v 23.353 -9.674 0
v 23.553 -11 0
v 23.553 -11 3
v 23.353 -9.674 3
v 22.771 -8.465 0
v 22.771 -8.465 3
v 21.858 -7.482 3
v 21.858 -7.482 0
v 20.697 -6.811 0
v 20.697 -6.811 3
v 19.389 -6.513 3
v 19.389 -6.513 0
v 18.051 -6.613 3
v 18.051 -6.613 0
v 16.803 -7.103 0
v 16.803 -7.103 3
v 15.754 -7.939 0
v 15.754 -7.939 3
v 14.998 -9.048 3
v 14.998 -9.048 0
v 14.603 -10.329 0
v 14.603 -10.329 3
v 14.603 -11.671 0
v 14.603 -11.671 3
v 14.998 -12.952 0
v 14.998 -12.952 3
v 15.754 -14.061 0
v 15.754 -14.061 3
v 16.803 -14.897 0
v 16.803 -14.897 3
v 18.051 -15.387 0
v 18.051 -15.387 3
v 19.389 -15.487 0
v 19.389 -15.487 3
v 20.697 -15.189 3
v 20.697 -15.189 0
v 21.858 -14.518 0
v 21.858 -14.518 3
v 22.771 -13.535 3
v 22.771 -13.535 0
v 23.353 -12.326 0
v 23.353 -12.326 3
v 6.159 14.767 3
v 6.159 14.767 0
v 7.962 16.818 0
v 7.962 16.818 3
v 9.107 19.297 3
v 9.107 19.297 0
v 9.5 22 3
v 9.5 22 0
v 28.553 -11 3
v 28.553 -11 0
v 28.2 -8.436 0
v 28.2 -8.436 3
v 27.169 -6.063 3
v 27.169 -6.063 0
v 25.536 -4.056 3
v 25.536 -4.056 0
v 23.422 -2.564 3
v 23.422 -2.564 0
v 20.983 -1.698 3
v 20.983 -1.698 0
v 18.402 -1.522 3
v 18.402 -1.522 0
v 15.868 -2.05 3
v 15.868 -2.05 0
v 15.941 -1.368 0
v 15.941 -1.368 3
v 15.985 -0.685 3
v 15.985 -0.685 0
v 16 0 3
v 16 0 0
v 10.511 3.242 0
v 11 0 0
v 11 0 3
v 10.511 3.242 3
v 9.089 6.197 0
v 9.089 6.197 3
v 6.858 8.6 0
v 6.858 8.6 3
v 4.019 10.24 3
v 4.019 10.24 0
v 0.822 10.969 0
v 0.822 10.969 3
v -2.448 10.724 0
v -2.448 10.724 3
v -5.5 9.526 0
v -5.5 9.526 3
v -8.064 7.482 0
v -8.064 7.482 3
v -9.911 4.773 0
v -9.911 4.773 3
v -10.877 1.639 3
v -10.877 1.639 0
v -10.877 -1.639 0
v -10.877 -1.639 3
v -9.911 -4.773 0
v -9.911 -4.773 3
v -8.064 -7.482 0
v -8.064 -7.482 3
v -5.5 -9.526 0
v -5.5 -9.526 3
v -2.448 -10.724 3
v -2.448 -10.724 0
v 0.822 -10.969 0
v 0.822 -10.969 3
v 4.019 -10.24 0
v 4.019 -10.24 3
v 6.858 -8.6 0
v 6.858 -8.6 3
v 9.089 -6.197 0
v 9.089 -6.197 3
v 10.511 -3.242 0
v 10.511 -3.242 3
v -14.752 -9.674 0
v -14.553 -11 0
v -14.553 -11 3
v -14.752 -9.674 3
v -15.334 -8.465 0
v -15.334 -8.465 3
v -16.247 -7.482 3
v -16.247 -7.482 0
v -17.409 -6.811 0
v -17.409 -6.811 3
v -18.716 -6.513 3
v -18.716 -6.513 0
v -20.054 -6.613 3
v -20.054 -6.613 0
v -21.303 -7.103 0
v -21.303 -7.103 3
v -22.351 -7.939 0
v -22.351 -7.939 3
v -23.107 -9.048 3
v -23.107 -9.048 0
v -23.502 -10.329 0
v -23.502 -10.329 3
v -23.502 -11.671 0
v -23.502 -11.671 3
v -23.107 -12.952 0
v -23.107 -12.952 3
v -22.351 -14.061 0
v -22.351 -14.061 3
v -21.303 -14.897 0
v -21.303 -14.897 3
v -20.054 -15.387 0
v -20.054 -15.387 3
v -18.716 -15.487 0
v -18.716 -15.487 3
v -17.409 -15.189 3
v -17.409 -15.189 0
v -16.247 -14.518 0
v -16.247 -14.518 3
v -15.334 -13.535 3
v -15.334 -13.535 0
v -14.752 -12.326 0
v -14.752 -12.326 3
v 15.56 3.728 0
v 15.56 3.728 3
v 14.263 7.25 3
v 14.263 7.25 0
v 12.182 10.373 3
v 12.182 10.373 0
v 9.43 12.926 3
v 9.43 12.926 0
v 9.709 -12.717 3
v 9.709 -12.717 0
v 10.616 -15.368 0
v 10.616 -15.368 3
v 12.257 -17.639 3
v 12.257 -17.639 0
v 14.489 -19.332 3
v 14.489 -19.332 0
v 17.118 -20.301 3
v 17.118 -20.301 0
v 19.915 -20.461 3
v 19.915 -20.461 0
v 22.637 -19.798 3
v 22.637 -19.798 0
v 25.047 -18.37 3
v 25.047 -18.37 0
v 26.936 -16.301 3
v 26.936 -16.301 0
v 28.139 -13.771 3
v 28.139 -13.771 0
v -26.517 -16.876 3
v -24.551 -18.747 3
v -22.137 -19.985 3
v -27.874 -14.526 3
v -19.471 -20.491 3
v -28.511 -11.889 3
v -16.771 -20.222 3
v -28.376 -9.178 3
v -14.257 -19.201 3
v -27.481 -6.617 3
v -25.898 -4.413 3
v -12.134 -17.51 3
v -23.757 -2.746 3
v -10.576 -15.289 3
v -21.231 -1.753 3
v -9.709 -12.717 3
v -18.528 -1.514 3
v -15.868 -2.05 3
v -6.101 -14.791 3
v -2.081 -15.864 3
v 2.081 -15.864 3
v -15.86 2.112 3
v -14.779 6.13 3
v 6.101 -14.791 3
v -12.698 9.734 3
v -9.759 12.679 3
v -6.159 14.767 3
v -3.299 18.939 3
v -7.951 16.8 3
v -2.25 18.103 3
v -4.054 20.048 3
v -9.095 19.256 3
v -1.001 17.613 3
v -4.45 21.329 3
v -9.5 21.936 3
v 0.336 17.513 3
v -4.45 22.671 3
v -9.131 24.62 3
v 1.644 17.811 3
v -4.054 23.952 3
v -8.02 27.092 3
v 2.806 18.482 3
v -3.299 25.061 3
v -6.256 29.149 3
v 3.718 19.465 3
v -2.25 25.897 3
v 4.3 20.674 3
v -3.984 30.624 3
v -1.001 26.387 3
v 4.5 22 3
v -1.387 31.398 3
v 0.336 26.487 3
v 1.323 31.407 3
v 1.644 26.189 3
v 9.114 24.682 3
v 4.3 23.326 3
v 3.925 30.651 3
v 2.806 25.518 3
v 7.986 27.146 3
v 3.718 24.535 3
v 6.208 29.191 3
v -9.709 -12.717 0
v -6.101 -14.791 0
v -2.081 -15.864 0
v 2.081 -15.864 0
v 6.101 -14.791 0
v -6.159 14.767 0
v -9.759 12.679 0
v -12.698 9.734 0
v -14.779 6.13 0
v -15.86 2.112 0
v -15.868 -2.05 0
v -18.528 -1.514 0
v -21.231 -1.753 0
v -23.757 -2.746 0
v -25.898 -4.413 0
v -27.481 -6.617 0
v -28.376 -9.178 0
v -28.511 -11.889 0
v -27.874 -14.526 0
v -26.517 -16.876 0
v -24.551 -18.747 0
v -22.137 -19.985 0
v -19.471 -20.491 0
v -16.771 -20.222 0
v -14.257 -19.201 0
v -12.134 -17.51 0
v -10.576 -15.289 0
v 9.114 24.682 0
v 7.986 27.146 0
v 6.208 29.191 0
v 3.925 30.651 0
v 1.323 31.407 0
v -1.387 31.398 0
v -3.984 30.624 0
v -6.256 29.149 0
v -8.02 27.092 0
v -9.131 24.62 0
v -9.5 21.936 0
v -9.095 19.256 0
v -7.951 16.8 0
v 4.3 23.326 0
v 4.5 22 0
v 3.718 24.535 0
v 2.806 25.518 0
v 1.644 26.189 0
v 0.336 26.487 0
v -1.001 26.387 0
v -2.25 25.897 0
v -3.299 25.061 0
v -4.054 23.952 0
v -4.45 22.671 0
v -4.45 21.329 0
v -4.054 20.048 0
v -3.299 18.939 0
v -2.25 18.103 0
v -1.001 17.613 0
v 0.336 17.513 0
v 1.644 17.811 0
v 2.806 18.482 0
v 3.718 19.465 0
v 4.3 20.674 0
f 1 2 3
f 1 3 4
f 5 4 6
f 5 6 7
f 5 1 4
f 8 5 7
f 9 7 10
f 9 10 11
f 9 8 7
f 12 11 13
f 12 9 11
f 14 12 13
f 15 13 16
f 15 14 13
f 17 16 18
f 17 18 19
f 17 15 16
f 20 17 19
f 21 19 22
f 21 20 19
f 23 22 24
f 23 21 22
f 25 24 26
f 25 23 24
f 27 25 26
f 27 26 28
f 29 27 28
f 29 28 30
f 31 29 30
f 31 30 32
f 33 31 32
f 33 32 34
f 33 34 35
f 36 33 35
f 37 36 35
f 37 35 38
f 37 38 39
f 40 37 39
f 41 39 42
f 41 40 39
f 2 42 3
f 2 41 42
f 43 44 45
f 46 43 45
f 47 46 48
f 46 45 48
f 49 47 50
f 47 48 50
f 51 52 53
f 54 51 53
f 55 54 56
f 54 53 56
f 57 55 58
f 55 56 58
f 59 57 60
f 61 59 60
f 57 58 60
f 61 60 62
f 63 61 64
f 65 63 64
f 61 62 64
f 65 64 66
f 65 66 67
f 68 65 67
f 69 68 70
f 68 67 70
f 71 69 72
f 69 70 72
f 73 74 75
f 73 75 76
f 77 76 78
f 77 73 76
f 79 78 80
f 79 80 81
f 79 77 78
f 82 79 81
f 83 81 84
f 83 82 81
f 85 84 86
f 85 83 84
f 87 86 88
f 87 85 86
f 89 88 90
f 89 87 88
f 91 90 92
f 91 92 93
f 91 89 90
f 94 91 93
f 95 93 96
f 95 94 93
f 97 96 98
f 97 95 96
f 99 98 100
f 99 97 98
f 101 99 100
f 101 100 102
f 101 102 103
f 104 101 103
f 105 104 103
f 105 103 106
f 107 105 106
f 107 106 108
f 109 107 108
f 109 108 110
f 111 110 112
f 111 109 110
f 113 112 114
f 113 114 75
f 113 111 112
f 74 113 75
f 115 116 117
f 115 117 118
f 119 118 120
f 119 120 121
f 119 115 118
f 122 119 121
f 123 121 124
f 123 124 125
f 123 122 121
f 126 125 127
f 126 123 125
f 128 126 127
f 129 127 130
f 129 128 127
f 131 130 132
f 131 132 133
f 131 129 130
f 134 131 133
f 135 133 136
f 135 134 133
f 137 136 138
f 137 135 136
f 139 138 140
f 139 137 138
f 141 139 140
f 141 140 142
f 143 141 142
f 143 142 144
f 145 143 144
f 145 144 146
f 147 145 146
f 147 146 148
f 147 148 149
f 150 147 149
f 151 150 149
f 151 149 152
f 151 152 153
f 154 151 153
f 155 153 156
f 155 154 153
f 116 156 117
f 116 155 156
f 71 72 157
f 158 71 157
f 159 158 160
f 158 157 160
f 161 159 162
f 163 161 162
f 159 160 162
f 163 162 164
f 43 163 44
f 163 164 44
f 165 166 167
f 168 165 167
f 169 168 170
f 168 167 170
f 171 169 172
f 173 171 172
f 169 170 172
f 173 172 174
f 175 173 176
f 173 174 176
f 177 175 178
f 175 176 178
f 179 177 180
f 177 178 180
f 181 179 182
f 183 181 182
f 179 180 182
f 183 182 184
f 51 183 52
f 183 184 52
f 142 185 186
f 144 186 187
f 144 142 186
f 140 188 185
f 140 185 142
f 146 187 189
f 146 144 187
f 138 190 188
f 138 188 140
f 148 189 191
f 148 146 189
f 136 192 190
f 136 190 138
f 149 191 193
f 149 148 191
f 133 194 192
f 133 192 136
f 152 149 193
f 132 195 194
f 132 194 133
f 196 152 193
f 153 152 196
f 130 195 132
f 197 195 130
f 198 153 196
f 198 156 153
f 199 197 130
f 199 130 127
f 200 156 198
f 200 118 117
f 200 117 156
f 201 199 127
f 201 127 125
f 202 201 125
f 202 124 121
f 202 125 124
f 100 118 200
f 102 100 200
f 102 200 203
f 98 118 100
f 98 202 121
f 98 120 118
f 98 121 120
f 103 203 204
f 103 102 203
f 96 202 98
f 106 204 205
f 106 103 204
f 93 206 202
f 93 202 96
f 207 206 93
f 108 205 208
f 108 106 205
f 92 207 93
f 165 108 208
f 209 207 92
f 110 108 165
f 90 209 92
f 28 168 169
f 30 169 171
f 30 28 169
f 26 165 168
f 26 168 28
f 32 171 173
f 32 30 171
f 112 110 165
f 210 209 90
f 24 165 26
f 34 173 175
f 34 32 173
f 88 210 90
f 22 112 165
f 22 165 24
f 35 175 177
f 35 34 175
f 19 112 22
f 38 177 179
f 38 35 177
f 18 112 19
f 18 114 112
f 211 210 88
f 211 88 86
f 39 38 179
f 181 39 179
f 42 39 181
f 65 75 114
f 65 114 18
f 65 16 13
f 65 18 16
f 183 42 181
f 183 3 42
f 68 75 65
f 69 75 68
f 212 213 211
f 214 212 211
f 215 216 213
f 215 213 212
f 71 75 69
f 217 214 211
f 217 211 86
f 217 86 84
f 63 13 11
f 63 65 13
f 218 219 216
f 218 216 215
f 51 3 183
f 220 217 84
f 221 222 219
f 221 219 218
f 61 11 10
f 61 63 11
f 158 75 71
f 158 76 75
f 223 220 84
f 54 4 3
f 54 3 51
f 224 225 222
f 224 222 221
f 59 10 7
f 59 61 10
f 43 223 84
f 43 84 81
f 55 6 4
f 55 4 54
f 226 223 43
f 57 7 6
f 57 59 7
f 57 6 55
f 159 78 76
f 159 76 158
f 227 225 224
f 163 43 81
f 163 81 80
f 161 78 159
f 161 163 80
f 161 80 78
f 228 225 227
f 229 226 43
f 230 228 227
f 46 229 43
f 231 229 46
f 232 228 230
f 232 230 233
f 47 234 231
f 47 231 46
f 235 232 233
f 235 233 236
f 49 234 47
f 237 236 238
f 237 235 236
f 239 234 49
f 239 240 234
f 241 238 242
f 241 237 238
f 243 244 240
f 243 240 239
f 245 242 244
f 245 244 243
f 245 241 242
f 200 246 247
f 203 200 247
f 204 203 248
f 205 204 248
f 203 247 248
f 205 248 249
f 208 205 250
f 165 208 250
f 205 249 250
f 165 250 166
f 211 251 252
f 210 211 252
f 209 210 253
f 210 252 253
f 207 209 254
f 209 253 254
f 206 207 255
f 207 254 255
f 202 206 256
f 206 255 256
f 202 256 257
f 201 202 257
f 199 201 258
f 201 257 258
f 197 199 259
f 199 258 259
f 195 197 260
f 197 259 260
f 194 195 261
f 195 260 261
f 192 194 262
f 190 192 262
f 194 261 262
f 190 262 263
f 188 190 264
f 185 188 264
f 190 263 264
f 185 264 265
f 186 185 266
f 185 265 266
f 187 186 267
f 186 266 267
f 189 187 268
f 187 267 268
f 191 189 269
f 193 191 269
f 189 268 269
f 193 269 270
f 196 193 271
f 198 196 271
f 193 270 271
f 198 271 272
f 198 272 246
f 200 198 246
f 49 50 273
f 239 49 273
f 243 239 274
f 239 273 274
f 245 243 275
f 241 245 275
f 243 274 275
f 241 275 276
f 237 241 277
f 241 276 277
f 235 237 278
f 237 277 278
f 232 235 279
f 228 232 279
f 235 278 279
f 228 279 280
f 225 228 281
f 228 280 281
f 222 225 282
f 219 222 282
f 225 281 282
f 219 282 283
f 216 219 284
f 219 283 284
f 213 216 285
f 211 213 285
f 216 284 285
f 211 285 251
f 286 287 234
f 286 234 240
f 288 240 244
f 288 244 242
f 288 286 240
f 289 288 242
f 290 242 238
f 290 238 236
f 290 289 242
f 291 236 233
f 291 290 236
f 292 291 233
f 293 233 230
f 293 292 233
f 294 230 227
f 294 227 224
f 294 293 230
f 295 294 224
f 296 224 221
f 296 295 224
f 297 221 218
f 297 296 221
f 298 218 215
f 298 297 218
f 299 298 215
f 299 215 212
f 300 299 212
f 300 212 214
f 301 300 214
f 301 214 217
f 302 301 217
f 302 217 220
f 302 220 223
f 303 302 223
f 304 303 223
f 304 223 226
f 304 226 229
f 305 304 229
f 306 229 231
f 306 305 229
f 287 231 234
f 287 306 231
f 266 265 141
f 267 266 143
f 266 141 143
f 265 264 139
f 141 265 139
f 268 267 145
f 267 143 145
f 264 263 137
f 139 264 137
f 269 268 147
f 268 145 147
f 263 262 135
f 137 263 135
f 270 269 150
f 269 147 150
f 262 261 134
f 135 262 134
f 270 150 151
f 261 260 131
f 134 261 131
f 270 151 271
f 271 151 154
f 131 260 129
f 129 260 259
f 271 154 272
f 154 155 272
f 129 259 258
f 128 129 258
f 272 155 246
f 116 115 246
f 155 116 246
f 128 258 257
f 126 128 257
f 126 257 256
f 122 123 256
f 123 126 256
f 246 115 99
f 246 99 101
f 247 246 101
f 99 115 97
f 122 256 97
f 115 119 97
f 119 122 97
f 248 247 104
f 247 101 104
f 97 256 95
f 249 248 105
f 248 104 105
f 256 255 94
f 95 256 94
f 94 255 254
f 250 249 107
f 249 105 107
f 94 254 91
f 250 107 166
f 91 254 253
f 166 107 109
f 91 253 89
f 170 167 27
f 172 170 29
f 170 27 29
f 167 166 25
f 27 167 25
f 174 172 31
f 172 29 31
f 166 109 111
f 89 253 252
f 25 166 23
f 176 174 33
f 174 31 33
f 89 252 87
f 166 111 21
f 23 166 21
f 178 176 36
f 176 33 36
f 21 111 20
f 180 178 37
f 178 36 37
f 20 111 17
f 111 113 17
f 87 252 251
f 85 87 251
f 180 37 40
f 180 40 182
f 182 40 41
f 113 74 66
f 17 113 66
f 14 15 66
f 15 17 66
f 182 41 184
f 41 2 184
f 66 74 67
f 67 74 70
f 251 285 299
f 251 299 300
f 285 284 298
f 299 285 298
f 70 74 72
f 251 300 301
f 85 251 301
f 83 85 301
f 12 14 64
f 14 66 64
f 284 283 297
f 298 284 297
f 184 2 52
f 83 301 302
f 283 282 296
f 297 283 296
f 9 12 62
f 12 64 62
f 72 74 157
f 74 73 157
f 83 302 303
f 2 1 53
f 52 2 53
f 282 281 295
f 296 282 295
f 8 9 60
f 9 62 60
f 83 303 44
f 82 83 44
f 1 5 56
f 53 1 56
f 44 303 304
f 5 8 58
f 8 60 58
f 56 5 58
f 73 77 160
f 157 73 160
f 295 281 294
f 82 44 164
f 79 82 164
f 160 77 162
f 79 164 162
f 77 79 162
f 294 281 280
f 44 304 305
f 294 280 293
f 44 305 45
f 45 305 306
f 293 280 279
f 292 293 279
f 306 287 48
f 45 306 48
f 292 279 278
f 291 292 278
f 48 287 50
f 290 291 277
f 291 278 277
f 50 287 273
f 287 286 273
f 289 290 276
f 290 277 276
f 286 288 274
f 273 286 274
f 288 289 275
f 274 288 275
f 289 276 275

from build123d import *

# Parameters (mm, degrees)
F0_R     = 4.500000108
F0_R_2   = 11
F1_DEPTH = 3


with BuildPart() as f1:
    # F0 (on Top) → F1 (new body)
    with BuildSketch(Plane.XY):
        with BuildLine():
            ThreePointArc((6.1590883621, 14.7670455174), (8.624422863, 18.0163672007), (9.5, 22))
            ThreePointArc((9.5, 22), (-3.9836327993, 30.624422863), (-6.1590883621, 14.7670455174))
            ThreePointArc((-6.1590883621, 14.7670455174), (0, 16.0000000864), (6.1590883621, 14.7670455174))
        make_face()
        with Locations((0, 22)):
            Circle(F0_R, mode=Mode.SUBTRACT)
        with BuildLine():
            ThreePointArc((6.1590883621, 14.7670455174), (0, 16.0000000864), (-6.1590883621, 14.7670455174))
            ThreePointArc((-6.1590883621, 14.7670455174), (0, 12.5), (6.1590883621, 14.7670455174))
        make_face()
        with BuildLine():
            ThreePointArc((6.1590883621, 14.7670455174), (0, 12.5), (-6.1590883621, 14.7670455174))
            ThreePointArc((-6.1590883621, 14.7670455174), (-13.8564065354, 8.0000000432), (-15.868180738, -2.0495957729))
            ThreePointArc((-15.868180738, -2.0495957729), (-11.2904202482, -5.5228471073), (-9.5525588833, -11))
            ThreePointArc((-9.5525588833, -11), (-9.5917731912, -11.8622842279), (-9.7090923758, -12.7174497444))
            ThreePointArc((-9.7090923758, -12.7174497444), (0, -16.0000000864), (9.7090923758, -12.7174497444))
            ThreePointArc((9.7090923758, -12.7174497444), (10.8253175473, -6.25), (15.868180738, -2.0495957729))
            ThreePointArc((15.868180738, -2.0495957729), (15.967011241, -1.0269151831), (16.0000000864, 0))
            ThreePointArc((16.0000000864, 0), (13.3143797657, 8.8728402566), (6.1590883621, 14.7670455174))
        make_face()
        Circle(F0_R_2, mode=Mode.SUBTRACT)
        with BuildLine():
            ThreePointArc((-9.7090923758, -12.7174497444), (-13.8564065354, -8.0000000432), (-15.868180738, -2.0495957729))
            ThreePointArc((-15.868180738, -2.0495957729), (-27.2798002192, -15.75), (-9.7090923758, -12.7174497444))
        make_face()
        with Locations((-19.0525588833, -11)):
            Circle(F0_R, mode=Mode.SUBTRACT)
        with BuildLine():
            ThreePointArc((-9.5525588833, -11), (-11.2904202482, -5.5228471073), (-15.868180738, -2.0495957729))
            ThreePointArc((-15.868180738, -2.0495957729), (-13.8564065354, -8.0000000432), (-9.7090923758, -12.7174497444))
            ThreePointArc((-9.7090923758, -12.7174497444), (-9.5917731912, -11.8622842279), (-9.5525588833, -11))
        make_face()
        with BuildLine():
            ThreePointArc((9.7090923758, -12.7174497444), (13.8564065354, -8.0000000432), (15.868180738, -2.0495957729))
            ThreePointArc((15.868180738, -2.0495957729), (10.8253175473, -6.25), (9.7090923758, -12.7174497444))
        make_face()
        with BuildLine():
            ThreePointArc((28.5525588833, -11), (24.5297117759, -3.2378613649), (15.868180738, -2.0495957729))
            ThreePointArc((15.868180738, -2.0495957729), (13.8564065354, -8.0000000432), (9.7090923758, -12.7174497444))
            ThreePointArc((9.7090923758, -12.7174497444), (19.9148431112, -20.460785692), (28.5525588833, -11))
        make_face()
        with Locations((19.0525588833, -11)):
            Circle(F0_R, mode=Mode.SUBTRACT)
    extrude(amount=F1_DEPTH)


with BuildPart() as f2_1:
    # F2: copy of F1
    add(f1.part.moved(Location((0, 0, 10))))


solid = f1.part
